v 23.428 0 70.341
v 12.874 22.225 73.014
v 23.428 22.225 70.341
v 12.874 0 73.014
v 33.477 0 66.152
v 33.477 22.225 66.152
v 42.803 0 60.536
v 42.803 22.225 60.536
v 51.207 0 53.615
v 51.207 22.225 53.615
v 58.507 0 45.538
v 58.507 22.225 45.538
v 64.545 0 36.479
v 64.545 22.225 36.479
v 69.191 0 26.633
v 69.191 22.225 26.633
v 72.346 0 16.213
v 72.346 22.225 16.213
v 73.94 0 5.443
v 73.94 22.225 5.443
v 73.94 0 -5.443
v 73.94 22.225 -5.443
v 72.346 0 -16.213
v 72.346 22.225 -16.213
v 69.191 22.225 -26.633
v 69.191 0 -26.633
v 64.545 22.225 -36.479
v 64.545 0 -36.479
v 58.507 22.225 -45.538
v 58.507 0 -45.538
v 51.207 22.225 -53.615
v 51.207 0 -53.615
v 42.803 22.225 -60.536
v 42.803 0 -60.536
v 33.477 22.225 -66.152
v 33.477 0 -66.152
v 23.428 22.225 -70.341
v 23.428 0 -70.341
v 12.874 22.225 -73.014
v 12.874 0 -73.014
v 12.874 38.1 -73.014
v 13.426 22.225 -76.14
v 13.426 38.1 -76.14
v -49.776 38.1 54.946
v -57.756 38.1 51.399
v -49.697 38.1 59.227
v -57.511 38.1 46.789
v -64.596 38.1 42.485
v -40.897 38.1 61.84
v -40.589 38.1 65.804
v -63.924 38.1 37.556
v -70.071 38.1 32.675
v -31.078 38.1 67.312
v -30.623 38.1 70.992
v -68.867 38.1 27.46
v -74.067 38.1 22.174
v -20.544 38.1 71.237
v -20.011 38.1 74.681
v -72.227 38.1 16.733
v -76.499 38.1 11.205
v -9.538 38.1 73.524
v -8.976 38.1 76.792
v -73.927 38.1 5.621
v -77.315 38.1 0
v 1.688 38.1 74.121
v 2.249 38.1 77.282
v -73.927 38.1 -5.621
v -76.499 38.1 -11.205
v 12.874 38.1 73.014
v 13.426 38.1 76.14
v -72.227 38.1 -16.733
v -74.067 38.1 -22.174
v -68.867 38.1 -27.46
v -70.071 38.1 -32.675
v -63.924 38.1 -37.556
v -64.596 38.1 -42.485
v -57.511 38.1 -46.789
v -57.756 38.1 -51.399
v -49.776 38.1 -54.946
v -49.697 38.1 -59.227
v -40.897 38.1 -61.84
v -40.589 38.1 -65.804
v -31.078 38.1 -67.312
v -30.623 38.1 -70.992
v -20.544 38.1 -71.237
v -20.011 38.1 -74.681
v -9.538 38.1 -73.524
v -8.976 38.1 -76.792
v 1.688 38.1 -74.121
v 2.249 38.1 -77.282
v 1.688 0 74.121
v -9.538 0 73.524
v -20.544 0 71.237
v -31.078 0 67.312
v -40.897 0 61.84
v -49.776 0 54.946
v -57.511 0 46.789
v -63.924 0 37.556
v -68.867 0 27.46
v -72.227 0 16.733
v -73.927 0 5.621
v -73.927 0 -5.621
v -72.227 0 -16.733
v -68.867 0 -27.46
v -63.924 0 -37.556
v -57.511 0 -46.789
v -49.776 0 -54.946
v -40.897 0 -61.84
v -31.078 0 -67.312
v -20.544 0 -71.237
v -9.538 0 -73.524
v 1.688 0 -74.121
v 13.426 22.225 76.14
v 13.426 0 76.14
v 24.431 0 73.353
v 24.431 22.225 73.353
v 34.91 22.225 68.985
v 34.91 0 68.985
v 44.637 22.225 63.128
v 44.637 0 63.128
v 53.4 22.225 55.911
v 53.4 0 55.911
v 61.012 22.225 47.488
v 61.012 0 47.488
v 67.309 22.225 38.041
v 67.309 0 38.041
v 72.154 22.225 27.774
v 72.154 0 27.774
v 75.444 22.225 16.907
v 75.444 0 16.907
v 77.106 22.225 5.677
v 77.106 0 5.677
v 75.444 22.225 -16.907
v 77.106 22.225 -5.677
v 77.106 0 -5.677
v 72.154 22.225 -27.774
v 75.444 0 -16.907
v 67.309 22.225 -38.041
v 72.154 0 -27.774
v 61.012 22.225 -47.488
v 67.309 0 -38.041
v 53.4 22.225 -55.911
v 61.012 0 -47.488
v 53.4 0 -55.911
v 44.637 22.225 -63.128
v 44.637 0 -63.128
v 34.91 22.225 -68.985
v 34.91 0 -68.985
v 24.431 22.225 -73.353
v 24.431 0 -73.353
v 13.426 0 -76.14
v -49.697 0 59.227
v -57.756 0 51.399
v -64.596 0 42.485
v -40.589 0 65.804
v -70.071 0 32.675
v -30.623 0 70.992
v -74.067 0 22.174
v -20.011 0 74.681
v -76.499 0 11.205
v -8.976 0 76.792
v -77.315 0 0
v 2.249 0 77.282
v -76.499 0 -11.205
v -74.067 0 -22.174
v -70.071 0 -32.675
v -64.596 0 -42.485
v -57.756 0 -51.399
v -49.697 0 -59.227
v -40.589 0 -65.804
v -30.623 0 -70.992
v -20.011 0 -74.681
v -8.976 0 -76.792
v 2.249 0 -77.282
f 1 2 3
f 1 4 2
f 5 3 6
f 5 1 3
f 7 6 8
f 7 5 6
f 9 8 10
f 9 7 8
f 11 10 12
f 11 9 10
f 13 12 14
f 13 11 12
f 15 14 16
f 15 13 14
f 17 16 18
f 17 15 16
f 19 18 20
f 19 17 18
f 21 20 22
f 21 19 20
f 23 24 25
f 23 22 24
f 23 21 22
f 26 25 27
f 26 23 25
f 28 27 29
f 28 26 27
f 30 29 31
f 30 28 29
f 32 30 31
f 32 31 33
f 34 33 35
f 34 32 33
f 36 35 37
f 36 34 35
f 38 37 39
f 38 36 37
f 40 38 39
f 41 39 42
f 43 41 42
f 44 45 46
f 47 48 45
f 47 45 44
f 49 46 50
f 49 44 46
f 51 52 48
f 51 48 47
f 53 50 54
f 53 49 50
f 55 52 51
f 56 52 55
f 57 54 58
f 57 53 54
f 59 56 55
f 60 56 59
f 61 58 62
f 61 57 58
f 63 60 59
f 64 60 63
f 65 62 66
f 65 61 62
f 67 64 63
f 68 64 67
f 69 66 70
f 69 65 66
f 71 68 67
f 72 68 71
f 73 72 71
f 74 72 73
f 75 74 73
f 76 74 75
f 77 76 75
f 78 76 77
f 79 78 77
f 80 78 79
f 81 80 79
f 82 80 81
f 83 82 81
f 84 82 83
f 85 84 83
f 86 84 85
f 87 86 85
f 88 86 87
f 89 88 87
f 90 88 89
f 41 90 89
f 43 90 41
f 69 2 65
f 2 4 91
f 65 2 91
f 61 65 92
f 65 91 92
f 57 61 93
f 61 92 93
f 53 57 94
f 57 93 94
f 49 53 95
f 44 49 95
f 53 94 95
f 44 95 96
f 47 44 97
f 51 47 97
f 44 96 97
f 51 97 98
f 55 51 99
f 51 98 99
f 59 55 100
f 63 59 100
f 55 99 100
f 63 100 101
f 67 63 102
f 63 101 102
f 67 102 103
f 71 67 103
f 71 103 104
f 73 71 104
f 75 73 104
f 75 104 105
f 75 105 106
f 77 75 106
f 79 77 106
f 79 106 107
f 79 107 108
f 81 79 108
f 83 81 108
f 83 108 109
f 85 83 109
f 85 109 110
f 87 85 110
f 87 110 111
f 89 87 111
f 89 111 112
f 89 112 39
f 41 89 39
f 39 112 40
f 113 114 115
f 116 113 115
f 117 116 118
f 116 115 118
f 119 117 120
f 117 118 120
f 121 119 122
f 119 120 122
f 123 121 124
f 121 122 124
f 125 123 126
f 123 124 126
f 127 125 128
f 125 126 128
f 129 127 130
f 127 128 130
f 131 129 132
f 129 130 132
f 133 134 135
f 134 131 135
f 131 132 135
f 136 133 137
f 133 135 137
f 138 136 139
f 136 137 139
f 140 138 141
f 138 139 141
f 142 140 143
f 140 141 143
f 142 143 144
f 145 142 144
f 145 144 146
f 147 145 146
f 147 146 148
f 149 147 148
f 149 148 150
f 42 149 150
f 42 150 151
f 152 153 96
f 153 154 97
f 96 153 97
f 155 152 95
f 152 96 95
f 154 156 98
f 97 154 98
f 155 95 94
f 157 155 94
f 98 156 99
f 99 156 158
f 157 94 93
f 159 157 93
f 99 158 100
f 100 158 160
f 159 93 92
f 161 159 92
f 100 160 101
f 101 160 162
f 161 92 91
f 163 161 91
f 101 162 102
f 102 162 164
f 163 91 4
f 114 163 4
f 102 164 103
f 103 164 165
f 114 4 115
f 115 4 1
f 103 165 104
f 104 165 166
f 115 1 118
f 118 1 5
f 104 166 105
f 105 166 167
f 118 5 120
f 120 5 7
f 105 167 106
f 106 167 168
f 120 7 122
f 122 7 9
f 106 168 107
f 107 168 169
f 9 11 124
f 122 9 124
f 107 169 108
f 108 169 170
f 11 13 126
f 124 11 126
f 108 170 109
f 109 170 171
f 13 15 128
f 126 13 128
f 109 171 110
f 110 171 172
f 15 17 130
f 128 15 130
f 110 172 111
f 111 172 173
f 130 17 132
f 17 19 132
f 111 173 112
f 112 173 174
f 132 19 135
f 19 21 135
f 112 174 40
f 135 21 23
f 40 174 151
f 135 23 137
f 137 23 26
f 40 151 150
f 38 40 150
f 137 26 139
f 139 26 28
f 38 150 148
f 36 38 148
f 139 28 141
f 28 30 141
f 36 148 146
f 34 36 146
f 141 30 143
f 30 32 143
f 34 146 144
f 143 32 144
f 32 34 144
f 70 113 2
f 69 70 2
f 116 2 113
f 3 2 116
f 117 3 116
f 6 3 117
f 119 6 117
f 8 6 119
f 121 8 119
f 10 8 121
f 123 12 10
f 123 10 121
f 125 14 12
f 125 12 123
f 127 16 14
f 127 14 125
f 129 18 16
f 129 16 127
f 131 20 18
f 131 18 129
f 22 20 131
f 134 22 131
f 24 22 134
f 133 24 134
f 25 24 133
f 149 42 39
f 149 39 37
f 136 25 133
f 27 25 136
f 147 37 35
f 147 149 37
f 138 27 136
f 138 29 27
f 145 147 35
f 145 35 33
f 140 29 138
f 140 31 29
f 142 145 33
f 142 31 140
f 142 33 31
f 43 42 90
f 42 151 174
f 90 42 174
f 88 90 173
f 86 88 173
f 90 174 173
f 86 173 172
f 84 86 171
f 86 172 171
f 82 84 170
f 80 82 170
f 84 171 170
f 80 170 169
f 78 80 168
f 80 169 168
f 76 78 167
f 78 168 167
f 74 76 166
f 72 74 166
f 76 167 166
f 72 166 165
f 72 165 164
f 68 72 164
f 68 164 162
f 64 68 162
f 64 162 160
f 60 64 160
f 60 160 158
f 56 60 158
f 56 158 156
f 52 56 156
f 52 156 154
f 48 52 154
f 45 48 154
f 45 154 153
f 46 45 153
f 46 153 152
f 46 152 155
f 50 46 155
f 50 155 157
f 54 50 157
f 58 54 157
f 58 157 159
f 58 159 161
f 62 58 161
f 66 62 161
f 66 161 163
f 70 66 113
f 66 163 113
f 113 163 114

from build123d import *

# Parameters (mm, degrees)
BOSS_EXTRUDE1_DEPTH = 38.1
SKETCH1_3_R         = 77.31506
SKETCH1_3_R_2       = 74.14006
BOSS_EXTRUDE2_DEPTH = 22.225


with BuildPart() as part:
    # Sketch1 → Boss-Extrude1 (new body)
    with BuildSketch(Plane(origin=(0, 0, 0), x_dir=(1, 0, 0), z_dir=(0, 1, 0))):
        with BuildLine():
            Line((13.425619275, -76.140470513), (12.874286311, -73.013705897))
            ThreePointArc((12.874286311, -73.013705897), (-74.14006, 0), (12.874286311, 73.013705897))
            Line((12.874286311, 73.013705897), (13.425619275, 76.140470513))
            ThreePointArc((13.425619275, 76.140470513), (-77.31506, 0), (13.425619275, -76.140470513))
        make_face()
    extrude(amount=BOSS_EXTRUDE1_DEPTH)

    # Sketch1_3 → Boss-Extrude2 (add)
    with BuildSketch(Plane(origin=(0, 0, 0), x_dir=(1, 0, 0), z_dir=(0, 1, 0))):
        Circle(SKETCH1_3_R)
        Circle(SKETCH1_3_R_2, mode=Mode.SUBTRACT)
    extrude(amount=BOSS_EXTRUDE2_DEPTH)


solid = part.part
